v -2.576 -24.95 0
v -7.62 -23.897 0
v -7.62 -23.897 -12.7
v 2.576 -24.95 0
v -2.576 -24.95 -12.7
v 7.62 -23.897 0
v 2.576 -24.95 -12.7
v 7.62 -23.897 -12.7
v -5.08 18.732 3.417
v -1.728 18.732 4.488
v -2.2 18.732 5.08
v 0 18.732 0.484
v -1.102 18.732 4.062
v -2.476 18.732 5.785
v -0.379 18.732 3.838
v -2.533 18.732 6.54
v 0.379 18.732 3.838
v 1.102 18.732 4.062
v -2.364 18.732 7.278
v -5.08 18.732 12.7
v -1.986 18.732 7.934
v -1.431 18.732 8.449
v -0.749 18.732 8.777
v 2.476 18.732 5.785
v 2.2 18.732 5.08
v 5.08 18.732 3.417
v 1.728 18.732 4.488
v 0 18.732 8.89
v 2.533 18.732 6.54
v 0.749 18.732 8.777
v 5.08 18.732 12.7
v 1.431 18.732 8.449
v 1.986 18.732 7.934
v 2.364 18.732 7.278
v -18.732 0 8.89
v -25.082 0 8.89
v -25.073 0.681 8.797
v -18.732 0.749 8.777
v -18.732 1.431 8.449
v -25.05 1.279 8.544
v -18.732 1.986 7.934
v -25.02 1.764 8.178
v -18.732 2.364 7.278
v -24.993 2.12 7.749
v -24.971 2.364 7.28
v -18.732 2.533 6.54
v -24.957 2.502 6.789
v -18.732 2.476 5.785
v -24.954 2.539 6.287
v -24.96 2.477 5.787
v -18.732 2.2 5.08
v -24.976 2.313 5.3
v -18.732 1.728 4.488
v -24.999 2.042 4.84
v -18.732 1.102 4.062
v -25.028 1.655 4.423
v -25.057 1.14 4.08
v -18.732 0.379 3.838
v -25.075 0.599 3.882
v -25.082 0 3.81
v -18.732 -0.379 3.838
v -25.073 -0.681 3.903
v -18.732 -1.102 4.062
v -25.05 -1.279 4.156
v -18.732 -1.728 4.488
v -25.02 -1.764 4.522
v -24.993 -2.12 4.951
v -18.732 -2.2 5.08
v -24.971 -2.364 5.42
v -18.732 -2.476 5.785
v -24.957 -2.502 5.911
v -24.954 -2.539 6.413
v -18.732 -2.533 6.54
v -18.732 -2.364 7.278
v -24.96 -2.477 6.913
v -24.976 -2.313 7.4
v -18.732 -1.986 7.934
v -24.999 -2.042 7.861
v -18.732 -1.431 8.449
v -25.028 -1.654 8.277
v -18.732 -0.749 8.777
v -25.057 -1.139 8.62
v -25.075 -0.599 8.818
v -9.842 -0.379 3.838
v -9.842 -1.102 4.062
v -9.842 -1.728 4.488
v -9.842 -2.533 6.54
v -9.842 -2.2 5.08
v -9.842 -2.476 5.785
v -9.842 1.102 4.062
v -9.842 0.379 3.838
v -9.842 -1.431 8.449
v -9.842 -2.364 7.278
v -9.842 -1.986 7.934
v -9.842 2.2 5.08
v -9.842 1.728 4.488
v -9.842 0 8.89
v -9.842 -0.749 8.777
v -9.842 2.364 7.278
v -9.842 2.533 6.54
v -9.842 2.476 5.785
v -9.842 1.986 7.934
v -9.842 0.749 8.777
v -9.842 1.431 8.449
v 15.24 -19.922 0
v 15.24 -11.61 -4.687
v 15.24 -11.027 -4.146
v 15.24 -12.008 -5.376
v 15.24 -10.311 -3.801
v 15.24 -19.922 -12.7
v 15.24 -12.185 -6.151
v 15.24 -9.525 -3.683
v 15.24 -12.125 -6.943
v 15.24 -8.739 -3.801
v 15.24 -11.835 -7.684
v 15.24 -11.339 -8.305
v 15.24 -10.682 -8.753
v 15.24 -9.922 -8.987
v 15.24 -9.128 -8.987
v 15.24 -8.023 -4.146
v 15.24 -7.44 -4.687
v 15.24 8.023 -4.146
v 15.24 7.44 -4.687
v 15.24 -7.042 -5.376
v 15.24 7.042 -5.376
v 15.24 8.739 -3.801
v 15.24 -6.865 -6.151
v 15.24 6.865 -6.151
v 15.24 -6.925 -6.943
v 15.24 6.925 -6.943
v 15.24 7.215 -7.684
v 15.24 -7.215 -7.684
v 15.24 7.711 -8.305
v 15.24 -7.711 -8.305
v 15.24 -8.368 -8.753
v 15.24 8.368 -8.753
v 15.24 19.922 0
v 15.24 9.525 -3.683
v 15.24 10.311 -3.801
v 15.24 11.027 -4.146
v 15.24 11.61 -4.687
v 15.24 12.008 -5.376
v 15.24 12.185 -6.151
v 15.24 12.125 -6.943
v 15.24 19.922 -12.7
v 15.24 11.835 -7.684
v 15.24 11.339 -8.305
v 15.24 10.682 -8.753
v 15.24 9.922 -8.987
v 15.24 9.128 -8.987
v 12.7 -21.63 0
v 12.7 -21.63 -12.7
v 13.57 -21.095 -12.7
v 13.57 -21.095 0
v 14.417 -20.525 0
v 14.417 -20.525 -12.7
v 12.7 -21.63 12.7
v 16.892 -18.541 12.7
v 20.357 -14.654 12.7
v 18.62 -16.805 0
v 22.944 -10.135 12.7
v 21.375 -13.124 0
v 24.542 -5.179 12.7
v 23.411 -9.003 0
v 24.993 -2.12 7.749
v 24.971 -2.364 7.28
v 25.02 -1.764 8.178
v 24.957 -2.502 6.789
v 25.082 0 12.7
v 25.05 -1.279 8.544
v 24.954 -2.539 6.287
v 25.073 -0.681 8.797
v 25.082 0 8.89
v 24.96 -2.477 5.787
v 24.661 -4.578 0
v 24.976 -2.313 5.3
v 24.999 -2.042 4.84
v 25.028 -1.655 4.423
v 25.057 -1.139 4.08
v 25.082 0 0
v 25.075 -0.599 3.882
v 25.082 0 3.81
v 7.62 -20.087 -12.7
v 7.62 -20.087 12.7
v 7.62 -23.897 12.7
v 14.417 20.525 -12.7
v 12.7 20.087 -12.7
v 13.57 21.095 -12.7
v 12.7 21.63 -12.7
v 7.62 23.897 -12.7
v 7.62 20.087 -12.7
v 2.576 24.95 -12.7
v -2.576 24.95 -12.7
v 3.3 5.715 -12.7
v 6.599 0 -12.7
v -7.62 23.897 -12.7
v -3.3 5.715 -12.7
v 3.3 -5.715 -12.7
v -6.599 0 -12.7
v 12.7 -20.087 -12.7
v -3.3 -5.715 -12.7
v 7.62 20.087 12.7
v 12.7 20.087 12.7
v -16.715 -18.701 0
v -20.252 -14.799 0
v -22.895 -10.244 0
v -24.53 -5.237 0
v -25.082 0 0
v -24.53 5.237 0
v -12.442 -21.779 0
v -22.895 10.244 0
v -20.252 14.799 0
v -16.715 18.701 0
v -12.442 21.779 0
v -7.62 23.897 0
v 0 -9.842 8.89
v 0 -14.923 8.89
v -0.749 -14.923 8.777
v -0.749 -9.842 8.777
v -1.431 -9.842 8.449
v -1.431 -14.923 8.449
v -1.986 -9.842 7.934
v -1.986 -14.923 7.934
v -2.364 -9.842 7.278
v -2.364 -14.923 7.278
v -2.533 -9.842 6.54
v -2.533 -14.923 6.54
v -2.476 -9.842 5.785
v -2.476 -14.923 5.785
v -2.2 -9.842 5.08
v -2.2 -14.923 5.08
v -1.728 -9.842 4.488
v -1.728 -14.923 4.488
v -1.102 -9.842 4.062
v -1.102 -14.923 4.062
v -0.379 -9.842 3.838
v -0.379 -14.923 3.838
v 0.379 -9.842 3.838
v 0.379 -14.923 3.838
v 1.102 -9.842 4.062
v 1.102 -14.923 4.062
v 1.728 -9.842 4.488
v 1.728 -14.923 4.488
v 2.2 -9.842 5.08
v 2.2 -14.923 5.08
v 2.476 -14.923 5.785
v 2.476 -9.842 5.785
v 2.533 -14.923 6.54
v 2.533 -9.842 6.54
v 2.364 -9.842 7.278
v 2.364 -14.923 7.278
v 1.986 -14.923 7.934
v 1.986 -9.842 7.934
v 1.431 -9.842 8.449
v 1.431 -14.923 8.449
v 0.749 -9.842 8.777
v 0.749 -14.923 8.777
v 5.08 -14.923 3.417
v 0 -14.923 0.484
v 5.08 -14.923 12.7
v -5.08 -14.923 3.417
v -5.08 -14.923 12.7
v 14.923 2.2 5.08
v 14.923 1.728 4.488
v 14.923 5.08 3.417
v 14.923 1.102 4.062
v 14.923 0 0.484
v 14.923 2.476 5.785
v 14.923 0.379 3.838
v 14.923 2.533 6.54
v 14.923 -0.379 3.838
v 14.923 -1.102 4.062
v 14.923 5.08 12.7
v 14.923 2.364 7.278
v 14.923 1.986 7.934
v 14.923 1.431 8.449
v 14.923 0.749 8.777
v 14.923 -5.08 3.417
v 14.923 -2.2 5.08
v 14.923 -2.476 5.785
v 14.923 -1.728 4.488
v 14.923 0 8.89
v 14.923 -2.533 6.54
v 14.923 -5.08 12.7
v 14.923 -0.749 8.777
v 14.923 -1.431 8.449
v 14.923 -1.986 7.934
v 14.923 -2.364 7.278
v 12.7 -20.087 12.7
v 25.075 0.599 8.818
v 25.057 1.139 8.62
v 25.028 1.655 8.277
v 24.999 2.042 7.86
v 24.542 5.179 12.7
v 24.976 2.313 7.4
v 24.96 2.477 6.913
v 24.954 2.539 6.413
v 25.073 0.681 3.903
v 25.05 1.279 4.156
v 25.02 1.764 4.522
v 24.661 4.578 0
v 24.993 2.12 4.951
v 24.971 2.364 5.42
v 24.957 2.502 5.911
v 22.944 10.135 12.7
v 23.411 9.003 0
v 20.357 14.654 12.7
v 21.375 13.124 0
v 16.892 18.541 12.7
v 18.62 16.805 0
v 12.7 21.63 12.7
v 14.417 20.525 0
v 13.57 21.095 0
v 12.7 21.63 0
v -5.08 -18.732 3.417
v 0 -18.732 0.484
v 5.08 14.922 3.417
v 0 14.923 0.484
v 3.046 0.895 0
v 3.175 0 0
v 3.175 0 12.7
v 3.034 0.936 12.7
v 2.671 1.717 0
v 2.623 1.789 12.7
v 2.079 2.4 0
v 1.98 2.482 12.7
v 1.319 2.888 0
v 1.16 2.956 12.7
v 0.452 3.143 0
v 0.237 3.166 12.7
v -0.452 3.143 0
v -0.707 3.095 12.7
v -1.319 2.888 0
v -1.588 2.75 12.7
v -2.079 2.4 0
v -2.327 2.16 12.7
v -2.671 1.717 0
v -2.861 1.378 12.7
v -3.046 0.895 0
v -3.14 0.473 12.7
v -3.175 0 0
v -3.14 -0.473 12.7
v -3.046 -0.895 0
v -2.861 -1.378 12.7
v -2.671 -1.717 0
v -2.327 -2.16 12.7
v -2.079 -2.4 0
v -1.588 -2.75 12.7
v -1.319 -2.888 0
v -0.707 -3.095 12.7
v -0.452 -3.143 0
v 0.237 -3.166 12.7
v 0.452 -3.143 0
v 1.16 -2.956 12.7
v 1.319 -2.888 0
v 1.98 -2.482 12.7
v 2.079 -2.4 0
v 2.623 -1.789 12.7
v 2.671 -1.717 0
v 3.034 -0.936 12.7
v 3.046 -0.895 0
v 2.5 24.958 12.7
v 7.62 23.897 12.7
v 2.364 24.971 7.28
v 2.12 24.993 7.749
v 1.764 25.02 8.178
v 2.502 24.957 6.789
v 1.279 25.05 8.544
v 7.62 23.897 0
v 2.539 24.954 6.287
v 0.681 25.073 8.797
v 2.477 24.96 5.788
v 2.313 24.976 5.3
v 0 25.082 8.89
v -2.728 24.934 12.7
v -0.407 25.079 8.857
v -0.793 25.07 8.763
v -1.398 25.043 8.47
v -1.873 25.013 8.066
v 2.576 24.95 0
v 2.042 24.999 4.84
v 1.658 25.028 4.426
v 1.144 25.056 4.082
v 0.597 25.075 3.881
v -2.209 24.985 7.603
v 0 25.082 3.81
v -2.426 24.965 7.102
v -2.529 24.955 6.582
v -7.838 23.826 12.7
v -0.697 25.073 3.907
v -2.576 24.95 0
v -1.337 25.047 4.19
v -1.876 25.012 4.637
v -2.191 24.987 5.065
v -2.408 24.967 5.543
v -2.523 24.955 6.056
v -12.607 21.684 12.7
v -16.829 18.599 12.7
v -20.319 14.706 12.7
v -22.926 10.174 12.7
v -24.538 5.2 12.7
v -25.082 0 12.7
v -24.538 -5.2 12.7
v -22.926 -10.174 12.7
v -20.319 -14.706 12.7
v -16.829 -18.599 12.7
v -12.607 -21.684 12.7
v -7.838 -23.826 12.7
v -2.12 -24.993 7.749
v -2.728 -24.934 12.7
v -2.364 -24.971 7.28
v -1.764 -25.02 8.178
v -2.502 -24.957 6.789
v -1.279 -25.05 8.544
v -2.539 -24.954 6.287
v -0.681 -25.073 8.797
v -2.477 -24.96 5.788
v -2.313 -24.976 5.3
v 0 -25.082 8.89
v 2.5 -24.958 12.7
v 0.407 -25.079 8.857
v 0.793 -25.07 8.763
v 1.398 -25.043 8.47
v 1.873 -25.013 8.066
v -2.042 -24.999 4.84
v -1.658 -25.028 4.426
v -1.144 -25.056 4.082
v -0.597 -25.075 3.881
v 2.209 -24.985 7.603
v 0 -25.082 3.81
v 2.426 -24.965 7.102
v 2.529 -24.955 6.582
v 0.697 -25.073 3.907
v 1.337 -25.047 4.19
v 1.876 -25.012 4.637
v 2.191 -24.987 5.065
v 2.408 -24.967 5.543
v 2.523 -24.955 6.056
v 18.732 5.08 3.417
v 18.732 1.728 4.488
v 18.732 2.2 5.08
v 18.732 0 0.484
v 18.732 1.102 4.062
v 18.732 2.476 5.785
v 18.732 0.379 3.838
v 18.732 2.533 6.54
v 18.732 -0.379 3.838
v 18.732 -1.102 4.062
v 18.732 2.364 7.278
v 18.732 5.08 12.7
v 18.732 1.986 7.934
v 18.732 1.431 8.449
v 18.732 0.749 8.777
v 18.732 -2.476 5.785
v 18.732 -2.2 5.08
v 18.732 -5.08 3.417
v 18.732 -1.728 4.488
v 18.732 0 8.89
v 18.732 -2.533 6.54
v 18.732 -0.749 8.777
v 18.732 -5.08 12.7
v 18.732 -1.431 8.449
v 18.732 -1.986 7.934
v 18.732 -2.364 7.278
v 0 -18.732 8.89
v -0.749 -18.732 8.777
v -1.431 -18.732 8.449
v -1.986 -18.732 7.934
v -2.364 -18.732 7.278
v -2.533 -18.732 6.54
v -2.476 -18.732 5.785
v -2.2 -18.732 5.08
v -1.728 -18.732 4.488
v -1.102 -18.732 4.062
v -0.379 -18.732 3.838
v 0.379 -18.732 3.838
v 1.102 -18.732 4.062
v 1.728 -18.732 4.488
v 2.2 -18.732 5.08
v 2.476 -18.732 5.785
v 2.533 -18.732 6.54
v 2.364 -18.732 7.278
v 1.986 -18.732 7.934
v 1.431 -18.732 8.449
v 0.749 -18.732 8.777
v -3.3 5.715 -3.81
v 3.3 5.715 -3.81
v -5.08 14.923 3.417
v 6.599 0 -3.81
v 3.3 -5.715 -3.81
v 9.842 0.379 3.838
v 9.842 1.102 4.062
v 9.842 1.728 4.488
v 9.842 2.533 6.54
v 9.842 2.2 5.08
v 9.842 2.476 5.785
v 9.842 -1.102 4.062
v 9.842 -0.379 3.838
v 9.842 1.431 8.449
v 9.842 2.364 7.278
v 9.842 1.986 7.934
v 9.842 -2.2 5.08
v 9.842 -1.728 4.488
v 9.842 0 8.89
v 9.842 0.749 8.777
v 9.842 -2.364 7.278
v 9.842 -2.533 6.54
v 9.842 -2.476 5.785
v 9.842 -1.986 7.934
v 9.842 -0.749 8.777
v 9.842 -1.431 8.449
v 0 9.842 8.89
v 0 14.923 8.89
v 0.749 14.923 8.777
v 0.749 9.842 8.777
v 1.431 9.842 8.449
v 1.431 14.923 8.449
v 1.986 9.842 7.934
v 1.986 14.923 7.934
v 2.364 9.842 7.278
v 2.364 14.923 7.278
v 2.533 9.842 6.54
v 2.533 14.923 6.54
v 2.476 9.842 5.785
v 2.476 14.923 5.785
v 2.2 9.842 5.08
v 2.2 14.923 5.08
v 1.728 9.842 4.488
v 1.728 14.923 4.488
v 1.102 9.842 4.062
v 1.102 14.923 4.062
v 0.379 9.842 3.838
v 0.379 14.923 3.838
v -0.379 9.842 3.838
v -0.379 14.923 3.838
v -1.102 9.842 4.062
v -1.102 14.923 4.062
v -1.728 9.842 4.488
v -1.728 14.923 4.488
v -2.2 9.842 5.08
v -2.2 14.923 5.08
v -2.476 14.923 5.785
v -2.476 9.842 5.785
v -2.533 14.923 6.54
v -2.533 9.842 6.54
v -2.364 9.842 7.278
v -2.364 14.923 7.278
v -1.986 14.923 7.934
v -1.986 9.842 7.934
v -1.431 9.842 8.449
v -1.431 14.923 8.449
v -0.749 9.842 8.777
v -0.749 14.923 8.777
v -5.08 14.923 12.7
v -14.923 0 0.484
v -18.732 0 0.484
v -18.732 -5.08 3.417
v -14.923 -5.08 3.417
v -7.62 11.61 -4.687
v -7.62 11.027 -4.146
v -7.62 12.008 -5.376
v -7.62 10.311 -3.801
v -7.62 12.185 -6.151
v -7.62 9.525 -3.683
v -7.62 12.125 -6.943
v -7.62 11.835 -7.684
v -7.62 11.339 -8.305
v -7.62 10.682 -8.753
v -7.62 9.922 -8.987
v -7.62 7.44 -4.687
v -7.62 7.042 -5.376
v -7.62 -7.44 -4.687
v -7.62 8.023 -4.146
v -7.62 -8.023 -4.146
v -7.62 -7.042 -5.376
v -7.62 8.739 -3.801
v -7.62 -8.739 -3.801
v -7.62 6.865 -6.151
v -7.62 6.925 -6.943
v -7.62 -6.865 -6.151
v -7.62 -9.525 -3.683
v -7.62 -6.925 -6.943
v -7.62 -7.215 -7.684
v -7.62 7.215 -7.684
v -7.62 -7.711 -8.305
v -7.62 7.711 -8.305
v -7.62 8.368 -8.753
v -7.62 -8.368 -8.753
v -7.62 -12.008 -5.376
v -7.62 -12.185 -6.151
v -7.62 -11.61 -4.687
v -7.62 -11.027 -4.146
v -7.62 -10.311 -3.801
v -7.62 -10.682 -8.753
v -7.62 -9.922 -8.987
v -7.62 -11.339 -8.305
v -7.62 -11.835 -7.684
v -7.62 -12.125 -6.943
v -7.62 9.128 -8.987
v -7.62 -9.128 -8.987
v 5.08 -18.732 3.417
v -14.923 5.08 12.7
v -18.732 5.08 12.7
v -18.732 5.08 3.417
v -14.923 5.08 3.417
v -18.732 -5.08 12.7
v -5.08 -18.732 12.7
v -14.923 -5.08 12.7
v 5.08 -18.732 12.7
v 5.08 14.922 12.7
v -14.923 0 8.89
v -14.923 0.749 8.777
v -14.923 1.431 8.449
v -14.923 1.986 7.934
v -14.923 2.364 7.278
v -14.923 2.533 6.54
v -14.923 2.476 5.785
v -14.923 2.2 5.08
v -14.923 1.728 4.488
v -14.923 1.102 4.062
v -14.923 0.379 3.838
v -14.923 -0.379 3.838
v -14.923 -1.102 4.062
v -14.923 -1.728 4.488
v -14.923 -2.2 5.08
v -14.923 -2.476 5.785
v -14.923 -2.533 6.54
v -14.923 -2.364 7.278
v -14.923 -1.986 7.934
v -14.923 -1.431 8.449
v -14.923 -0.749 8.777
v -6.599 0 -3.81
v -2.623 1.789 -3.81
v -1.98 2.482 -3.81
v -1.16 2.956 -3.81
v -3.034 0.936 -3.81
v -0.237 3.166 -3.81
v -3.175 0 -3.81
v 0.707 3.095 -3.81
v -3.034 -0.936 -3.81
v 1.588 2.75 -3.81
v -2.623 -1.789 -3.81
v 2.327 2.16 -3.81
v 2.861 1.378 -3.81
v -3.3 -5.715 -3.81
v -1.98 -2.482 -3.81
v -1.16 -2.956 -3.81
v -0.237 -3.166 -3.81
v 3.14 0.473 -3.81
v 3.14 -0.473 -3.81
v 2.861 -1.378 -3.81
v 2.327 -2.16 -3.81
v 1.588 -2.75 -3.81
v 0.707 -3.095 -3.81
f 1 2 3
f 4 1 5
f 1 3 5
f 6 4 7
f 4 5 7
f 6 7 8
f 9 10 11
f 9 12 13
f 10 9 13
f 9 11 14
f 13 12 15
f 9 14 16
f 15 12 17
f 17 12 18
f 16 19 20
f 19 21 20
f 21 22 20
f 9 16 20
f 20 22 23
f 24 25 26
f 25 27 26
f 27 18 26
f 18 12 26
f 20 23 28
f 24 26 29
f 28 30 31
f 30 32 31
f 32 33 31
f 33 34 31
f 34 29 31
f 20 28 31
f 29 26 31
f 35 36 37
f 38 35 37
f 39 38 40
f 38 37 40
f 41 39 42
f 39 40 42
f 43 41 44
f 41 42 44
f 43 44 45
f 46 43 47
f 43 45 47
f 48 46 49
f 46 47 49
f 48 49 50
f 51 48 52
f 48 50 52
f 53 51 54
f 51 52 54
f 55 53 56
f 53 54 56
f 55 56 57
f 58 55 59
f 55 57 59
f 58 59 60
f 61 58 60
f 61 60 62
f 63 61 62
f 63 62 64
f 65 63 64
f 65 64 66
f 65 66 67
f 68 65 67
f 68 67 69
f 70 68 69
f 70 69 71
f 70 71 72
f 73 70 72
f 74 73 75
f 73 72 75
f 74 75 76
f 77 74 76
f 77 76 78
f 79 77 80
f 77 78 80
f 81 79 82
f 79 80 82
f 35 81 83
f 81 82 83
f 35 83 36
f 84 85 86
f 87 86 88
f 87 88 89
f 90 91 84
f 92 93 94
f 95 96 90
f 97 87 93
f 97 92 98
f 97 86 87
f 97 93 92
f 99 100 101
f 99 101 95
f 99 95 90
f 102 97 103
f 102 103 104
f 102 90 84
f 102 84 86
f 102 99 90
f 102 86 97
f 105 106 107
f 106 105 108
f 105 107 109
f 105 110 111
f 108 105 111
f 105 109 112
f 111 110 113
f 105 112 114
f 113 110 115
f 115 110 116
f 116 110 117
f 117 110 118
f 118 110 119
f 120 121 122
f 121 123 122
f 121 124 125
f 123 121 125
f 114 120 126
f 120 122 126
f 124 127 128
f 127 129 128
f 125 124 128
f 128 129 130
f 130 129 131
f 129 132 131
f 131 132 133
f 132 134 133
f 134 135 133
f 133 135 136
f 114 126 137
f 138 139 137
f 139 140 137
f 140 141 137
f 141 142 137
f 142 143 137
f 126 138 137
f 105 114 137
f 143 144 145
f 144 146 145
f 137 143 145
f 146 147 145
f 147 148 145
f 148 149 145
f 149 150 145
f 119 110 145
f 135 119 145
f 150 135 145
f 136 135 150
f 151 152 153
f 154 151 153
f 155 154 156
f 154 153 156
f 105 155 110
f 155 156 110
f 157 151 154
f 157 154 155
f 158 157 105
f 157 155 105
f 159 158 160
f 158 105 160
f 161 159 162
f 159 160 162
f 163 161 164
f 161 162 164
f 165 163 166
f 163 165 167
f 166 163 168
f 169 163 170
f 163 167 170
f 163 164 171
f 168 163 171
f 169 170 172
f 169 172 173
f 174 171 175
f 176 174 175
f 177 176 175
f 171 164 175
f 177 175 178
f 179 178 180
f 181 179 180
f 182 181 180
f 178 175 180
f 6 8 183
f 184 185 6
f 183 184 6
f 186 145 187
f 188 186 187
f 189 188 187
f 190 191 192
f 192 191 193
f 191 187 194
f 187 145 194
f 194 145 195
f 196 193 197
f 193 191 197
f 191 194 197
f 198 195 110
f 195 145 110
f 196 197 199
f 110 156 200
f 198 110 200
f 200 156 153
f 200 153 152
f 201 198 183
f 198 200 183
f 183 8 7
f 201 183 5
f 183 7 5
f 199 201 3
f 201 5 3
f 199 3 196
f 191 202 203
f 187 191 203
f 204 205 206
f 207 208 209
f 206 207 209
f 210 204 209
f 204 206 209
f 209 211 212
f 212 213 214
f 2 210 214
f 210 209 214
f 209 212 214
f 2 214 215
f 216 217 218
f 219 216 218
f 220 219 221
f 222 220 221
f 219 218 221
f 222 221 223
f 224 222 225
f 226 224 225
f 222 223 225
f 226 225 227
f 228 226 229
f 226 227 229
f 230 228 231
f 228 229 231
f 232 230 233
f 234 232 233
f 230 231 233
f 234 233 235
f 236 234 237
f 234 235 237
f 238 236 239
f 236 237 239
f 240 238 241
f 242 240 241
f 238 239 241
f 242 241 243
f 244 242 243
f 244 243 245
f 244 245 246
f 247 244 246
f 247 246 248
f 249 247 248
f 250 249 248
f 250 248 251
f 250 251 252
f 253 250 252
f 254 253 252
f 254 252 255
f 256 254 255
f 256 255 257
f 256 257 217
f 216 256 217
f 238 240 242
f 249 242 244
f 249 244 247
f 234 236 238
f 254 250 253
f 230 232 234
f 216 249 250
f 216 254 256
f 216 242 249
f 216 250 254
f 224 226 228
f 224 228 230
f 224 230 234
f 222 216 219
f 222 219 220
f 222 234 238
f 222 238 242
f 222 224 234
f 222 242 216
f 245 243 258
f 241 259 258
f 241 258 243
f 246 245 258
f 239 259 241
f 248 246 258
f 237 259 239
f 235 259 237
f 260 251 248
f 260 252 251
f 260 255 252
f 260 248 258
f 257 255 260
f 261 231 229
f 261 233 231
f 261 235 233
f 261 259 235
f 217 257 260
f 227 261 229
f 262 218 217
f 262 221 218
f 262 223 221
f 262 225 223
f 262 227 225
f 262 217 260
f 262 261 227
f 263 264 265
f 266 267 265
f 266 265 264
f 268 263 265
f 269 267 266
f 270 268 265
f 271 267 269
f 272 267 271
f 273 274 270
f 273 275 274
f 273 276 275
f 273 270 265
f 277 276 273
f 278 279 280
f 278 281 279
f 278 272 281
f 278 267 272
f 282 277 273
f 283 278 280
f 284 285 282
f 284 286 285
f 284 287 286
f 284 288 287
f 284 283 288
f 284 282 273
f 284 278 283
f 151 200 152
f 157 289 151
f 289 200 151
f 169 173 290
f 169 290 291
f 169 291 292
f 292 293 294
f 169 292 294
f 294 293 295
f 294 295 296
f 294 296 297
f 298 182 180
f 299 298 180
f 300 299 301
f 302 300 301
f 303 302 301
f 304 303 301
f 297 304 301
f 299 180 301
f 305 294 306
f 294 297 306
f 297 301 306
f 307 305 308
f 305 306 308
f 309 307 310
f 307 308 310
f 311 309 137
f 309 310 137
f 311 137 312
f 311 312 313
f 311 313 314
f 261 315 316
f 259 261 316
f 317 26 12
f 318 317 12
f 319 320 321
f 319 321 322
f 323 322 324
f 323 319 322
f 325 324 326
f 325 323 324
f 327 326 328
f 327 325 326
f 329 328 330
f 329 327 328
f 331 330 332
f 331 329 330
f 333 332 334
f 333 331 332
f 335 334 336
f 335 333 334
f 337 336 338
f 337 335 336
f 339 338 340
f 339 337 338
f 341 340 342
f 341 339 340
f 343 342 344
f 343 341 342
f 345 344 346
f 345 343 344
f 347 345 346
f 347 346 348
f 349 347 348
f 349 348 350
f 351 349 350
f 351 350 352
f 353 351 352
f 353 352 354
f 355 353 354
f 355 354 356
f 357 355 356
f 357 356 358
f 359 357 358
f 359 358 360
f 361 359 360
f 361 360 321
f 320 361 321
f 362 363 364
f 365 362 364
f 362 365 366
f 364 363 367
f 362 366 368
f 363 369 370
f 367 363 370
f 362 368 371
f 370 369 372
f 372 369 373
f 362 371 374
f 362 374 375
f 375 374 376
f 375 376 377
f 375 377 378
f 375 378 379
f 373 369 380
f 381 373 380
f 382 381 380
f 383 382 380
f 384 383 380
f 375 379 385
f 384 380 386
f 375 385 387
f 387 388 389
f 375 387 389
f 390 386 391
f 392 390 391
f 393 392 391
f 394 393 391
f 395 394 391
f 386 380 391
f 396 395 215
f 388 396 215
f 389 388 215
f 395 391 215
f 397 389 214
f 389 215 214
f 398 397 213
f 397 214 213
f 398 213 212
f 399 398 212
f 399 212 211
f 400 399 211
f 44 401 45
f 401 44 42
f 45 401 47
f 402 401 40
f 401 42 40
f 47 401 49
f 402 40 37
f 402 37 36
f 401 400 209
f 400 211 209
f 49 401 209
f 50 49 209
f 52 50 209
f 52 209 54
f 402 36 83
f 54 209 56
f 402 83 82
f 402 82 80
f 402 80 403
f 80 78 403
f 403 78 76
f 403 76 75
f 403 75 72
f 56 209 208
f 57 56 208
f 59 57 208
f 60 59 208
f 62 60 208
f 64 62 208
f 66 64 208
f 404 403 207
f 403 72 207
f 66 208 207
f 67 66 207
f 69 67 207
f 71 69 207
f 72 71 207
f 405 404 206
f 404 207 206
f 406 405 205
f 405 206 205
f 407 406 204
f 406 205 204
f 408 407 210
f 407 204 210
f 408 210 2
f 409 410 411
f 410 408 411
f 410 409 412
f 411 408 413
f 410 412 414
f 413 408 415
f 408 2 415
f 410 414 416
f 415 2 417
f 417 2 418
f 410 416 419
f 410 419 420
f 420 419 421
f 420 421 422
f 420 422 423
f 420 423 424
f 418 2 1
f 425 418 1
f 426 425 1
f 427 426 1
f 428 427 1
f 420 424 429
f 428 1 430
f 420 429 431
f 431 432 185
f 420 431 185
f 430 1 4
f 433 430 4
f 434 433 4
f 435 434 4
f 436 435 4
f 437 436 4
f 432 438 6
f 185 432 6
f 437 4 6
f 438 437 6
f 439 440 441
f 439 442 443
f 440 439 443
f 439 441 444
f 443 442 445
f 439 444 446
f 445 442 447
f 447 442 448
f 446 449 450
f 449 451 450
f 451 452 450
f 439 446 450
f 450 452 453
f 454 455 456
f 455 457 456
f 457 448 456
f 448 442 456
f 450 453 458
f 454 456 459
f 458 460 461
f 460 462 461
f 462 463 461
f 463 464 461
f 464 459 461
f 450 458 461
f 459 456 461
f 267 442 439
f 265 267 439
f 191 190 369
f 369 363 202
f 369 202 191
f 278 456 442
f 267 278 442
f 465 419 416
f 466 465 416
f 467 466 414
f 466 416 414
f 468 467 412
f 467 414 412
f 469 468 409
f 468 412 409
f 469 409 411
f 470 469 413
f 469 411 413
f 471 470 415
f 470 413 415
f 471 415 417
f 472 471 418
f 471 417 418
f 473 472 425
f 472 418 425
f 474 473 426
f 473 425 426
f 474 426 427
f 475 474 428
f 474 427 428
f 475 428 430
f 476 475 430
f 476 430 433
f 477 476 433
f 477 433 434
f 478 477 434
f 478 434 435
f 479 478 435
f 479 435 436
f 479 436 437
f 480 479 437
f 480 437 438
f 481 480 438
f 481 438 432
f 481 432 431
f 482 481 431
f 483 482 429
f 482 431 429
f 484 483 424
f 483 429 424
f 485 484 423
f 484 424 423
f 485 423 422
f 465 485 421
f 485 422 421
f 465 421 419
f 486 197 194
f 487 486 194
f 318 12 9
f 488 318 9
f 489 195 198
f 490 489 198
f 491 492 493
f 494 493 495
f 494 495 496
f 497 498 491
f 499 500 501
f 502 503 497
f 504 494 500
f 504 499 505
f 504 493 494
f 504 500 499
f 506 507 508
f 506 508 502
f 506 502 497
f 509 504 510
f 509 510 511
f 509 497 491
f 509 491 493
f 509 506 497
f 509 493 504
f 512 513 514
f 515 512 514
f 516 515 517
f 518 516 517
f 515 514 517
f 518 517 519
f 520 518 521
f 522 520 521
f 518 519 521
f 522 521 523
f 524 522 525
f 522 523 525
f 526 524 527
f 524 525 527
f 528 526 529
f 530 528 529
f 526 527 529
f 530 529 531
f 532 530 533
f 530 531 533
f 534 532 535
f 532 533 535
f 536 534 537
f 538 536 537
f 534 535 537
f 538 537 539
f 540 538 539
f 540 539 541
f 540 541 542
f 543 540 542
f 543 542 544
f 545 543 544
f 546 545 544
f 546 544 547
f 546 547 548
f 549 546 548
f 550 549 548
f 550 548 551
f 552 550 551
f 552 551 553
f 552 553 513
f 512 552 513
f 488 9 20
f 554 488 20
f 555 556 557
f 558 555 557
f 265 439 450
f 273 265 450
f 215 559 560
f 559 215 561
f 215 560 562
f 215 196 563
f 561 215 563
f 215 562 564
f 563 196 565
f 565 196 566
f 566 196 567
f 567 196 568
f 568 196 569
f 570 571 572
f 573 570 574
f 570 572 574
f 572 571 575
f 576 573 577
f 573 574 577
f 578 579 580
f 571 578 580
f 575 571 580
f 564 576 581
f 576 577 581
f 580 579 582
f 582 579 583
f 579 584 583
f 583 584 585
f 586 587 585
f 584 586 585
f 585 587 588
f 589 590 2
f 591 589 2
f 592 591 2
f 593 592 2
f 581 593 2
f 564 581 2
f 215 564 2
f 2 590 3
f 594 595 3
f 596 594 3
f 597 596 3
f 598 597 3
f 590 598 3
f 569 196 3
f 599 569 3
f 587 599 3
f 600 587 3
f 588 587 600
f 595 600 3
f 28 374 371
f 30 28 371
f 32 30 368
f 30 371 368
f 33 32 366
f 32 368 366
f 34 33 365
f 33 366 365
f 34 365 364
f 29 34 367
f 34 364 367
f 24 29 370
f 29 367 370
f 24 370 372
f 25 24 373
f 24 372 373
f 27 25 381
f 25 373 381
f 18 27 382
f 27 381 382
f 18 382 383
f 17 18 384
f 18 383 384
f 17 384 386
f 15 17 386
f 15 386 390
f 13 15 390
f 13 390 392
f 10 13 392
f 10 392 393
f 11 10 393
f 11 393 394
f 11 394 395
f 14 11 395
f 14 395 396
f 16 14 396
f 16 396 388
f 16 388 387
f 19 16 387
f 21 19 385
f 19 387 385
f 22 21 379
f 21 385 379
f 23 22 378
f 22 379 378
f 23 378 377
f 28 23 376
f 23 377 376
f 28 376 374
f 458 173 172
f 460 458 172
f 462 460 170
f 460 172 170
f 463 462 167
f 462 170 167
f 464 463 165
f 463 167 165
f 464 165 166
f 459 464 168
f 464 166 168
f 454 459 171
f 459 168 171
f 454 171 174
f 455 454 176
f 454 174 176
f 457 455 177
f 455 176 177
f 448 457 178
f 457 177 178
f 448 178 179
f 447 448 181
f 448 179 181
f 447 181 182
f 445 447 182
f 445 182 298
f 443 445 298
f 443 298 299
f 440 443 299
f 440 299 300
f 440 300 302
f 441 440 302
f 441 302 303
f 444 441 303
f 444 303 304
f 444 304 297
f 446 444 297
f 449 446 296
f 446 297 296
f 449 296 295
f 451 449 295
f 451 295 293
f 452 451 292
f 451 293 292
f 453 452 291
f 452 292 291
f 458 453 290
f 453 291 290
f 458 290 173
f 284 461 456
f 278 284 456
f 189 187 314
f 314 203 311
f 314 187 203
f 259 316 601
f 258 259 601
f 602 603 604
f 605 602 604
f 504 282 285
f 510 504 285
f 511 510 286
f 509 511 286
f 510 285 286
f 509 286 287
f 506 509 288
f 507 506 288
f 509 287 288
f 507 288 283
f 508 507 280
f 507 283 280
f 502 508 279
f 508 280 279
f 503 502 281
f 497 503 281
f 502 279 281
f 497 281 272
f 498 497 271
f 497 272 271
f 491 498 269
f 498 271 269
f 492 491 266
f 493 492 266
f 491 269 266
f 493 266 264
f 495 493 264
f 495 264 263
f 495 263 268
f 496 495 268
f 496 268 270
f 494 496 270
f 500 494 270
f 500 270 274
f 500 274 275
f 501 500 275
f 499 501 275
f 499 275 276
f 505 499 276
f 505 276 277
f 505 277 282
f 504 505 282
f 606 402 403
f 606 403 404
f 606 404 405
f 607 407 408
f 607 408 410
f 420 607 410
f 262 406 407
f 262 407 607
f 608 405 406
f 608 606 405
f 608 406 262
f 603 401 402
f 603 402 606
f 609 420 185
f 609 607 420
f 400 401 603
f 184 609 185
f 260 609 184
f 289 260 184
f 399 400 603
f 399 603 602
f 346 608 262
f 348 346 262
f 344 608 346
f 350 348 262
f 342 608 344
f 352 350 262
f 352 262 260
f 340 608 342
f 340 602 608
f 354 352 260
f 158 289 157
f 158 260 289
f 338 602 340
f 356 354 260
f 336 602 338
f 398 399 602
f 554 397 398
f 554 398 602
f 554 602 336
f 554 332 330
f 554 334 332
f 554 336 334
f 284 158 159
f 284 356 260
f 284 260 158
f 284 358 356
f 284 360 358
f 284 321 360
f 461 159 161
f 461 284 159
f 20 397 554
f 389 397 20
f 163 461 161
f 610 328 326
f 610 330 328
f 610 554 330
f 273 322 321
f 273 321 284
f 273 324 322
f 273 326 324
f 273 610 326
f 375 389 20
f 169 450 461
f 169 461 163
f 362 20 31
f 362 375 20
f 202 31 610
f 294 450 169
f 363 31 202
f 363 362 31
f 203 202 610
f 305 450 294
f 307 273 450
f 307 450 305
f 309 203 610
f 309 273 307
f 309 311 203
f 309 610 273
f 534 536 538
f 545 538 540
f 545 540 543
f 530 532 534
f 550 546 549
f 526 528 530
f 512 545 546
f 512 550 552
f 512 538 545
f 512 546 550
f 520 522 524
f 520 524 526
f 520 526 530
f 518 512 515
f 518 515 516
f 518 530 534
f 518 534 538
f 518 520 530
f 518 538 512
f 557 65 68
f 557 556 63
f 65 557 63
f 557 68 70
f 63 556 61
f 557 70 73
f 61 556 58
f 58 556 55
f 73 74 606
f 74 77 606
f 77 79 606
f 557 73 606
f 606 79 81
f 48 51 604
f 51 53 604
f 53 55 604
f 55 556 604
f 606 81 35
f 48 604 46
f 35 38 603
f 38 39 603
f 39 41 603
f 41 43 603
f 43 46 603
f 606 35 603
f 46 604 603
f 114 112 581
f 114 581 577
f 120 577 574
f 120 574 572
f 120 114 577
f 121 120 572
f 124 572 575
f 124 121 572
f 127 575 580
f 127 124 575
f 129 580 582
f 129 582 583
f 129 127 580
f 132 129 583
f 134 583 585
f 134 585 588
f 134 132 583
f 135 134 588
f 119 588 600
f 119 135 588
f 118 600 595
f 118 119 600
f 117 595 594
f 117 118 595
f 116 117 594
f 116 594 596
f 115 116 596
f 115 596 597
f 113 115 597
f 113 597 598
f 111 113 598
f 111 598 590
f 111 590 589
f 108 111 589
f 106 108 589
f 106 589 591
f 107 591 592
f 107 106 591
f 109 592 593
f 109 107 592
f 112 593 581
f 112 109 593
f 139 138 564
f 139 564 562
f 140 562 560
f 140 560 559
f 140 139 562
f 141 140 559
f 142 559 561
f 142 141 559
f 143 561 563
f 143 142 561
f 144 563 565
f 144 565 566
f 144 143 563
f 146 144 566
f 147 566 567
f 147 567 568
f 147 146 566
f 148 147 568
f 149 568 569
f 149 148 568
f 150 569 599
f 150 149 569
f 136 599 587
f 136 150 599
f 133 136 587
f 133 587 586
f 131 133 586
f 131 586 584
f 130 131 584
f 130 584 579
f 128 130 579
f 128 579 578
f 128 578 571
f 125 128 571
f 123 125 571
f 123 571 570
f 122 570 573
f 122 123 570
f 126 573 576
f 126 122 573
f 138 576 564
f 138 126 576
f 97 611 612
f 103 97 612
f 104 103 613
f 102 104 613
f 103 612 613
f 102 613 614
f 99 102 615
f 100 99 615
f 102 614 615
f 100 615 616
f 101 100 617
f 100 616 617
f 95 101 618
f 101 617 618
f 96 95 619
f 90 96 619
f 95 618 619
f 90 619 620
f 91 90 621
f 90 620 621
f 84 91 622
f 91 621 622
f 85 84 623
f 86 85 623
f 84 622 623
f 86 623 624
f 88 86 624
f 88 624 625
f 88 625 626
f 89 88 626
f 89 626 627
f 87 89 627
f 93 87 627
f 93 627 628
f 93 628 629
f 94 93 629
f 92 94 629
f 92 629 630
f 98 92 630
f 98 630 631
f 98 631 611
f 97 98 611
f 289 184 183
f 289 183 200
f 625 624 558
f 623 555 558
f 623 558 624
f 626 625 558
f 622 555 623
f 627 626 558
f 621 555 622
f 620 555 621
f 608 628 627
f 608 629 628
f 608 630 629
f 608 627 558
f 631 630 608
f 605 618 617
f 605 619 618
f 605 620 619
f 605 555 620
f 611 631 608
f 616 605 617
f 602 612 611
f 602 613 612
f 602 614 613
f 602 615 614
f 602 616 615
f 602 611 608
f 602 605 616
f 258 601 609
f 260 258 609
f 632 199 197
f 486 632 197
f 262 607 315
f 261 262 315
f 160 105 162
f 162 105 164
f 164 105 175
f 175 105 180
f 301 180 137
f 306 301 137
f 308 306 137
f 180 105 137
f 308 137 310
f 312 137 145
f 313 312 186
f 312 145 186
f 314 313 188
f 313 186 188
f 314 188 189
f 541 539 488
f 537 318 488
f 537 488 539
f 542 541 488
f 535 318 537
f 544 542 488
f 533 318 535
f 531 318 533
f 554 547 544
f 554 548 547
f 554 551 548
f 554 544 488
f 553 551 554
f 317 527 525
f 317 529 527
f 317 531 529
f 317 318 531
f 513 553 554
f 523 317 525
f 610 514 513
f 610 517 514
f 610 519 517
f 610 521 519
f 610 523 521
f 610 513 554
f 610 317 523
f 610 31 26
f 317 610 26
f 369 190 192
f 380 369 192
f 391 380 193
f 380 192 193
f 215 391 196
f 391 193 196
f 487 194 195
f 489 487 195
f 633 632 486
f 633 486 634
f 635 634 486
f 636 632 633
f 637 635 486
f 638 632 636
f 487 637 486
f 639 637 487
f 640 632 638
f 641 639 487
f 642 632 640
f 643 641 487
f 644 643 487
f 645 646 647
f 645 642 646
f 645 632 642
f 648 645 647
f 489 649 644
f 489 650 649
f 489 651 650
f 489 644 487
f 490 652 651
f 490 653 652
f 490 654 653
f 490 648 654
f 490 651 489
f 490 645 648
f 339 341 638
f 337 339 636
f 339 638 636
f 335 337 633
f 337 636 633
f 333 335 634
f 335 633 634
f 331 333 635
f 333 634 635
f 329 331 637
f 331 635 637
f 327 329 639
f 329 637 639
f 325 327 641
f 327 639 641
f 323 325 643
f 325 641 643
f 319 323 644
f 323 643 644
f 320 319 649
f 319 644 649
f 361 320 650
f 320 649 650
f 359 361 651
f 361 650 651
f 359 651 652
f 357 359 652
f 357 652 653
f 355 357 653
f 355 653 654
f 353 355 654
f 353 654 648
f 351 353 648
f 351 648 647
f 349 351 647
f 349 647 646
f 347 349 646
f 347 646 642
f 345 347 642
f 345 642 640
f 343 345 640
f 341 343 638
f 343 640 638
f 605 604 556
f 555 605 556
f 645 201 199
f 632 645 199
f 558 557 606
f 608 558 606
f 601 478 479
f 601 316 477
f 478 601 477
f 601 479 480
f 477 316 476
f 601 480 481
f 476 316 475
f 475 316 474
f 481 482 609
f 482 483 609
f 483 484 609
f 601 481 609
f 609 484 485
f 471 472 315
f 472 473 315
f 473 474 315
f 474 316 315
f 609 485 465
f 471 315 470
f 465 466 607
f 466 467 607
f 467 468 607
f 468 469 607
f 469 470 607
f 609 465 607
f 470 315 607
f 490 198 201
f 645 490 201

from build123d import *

# Parameters (mm, degrees)
SKETCH3_R                    = 25.0825
SKETCH3_R_2                  = 3.175
BASE_DEPTH                   = 12.7
UPPER_BOLTS_CONNECTION_START = 12.7
SKETCH6_R                    = 3.175
UPPER_BOLTS_CONNECTION_DEPTH = 12.7
NUT_HOLE_DEPTH               = 8.89
UPPER_BOLTHOLES_REACH        = 45.126
SKETCH9_R                    = 2.667
NUT_RECESS_START             = -6.35
NUT_RECESS_DEPTH             = 3.81
SKETCH14_R                   = 2.54
RADIAL_BOLT_HOLE_DEPTH       = 15.24
CIRPATTERN2_COUNT            = 4
WIRE_PASSTHROUGH_REACH       = 45.628
SKETCH15_W                   = 5.08
SKETCH15_H                   = 3.81


with BuildPart() as part:
    # Sketch3 → base (new body)
    with BuildSketch(Plane(origin=(0, 0, 0), x_dir=(0, 1, 0), z_dir=(0, 0, 1))):
        Circle(SKETCH3_R)
        Circle(SKETCH3_R_2, mode=Mode.SUBTRACT)
    extrude(amount=BASE_DEPTH)

    # Sketch6 → upper_bolts_connection (add)
    with BuildSketch(Plane(origin=(0, 0, 0), x_dir=(1, 0, 0), z_dir=(0, 0, -1)).offset(UPPER_BOLTS_CONNECTION_START)):
        with BuildLine():
            Line((15.24, 19.921701891), (15.24, -19.921701891))
            ThreePointArc((15.24, -19.921701891), (4.29731101, -24.711635404), (-7.62, -23.897016681))
            Line((-7.62, -23.897016681), (-7.62, 23.897016681))
            ThreePointArc((-7.62, 23.897016681), (4.29731101, 24.711635404), (15.24, 19.921701891))
        make_face()
        Circle(SKETCH6_R, mode=Mode.SUBTRACT)
    extrude(amount=-UPPER_BOLTS_CONNECTION_DEPTH)

    # Sketch8 → nut_hole (cut)
    with BuildSketch(Plane(origin=(0, 0, -12.7), x_dir=(1, 0, 0), z_dir=(0, 0, -1))):
        Polygon((6.599113577, 0), (3.299556788, 5.715), (-3.299556788, 5.715), (-6.599113577, 0), (-3.299556788, -5.715), (3.299556788, -5.715), align=None)
    extrude(amount=-NUT_HOLE_DEPTH, mode=Mode.SUBTRACT)

    # Sketch9 → upper_boltholes (cut, up to next)
    with BuildSketch(Plane.ZY.offset(7.62), mode=Mode.PRIVATE) as upper_boltholes_sk1:
        with Locations((-6.35, -9.525)):
            Circle(SKETCH9_R)
    upper_boltholes_tool1 = extrude(upper_boltholes_sk1.sketch, amount=-UPPER_BOLTHOLES_REACH, mode=Mode.PRIVATE) & part.part
    # Sketch9 → upper_boltholes (cut, up to next)
    with BuildSketch(Plane.ZY.offset(7.62), mode=Mode.PRIVATE) as upper_boltholes_sk2:
        with Locations((-6.35, 9.525)):
            Circle(SKETCH9_R)
    upper_boltholes_tool2 = extrude(upper_boltholes_sk2.sketch, amount=-UPPER_BOLTHOLES_REACH, mode=Mode.PRIVATE) & part.part
    add(upper_boltholes_tool1.solids().sort_by_distance((-7.62, -9.525, -6.35))[0], mode=Mode.SUBTRACT)
    add(upper_boltholes_tool2.solids().sort_by_distance((-7.62, 9.525, -6.35))[0], mode=Mode.SUBTRACT)

    # Sketch13 → nut_recess (cut)
    with BuildSketch(Plane.ZY.offset(25.0825).offset(NUT_RECESS_START)):
        Polygon((3.417060633, 5.08), (0.484121265, 0), (3.417060633, -5.08), (12.7, -5.08), (12.7, 5.08), align=None)
    nut_recess = extrude(amount=-NUT_RECESS_DEPTH, mode=Mode.SUBTRACT)

    # Sketch14 → radial_bolt_hole (cut)
    with BuildSketch(Plane.ZY.offset(25.0825)):
        with Locations((6.35, 0)):
            Circle(SKETCH14_R)
    radial_bolt_hole = extrude(amount=-RADIAL_BOLT_HOLE_DEPTH, mode=Mode.SUBTRACT)

    # CirPattern2: nut_recess, radial_bolt_hole ×4 about axis
    cirpattern2_axis = Axis((0, 0, 12.7), (0, 0, -1))
    add([nut_recess.rotate(cirpattern2_axis, i * 360 / CIRPATTERN2_COUNT) for i in range(1, CIRPATTERN2_COUNT)], mode=Mode.SUBTRACT)
    add([radial_bolt_hole.rotate(cirpattern2_axis, i * 360 / CIRPATTERN2_COUNT) for i in range(1, CIRPATTERN2_COUNT)], mode=Mode.SUBTRACT)

    # Sketch15 → wire_passthrough (cut, up to next)
    with BuildSketch(Plane(origin=(0, 0, -12.7), x_dir=(1, 0, 0), z_dir=(0, 0, -1)), mode=Mode.PRIVATE) as wire_passthrough_sk1:
        with Locations((10.16, 21.992016681)):
            Rectangle(SKETCH15_W, SKETCH15_H)
    wire_passthrough_tool1 = extrude(wire_passthrough_sk1.sketch, amount=-WIRE_PASSTHROUGH_REACH, mode=Mode.PRIVATE) & part.part
    wire_passthrough = wire_passthrough_tool1.solids().sort_by_distance((10.16, -21.992017, -12.7))[0]
    add(wire_passthrough, mode=Mode.SUBTRACT)

    # wire_passthrough_mirror: wire_passthrough across plane
    add(wire_passthrough.mirror(Plane.ZX), mode=Mode.SUBTRACT)


solid = part.part
